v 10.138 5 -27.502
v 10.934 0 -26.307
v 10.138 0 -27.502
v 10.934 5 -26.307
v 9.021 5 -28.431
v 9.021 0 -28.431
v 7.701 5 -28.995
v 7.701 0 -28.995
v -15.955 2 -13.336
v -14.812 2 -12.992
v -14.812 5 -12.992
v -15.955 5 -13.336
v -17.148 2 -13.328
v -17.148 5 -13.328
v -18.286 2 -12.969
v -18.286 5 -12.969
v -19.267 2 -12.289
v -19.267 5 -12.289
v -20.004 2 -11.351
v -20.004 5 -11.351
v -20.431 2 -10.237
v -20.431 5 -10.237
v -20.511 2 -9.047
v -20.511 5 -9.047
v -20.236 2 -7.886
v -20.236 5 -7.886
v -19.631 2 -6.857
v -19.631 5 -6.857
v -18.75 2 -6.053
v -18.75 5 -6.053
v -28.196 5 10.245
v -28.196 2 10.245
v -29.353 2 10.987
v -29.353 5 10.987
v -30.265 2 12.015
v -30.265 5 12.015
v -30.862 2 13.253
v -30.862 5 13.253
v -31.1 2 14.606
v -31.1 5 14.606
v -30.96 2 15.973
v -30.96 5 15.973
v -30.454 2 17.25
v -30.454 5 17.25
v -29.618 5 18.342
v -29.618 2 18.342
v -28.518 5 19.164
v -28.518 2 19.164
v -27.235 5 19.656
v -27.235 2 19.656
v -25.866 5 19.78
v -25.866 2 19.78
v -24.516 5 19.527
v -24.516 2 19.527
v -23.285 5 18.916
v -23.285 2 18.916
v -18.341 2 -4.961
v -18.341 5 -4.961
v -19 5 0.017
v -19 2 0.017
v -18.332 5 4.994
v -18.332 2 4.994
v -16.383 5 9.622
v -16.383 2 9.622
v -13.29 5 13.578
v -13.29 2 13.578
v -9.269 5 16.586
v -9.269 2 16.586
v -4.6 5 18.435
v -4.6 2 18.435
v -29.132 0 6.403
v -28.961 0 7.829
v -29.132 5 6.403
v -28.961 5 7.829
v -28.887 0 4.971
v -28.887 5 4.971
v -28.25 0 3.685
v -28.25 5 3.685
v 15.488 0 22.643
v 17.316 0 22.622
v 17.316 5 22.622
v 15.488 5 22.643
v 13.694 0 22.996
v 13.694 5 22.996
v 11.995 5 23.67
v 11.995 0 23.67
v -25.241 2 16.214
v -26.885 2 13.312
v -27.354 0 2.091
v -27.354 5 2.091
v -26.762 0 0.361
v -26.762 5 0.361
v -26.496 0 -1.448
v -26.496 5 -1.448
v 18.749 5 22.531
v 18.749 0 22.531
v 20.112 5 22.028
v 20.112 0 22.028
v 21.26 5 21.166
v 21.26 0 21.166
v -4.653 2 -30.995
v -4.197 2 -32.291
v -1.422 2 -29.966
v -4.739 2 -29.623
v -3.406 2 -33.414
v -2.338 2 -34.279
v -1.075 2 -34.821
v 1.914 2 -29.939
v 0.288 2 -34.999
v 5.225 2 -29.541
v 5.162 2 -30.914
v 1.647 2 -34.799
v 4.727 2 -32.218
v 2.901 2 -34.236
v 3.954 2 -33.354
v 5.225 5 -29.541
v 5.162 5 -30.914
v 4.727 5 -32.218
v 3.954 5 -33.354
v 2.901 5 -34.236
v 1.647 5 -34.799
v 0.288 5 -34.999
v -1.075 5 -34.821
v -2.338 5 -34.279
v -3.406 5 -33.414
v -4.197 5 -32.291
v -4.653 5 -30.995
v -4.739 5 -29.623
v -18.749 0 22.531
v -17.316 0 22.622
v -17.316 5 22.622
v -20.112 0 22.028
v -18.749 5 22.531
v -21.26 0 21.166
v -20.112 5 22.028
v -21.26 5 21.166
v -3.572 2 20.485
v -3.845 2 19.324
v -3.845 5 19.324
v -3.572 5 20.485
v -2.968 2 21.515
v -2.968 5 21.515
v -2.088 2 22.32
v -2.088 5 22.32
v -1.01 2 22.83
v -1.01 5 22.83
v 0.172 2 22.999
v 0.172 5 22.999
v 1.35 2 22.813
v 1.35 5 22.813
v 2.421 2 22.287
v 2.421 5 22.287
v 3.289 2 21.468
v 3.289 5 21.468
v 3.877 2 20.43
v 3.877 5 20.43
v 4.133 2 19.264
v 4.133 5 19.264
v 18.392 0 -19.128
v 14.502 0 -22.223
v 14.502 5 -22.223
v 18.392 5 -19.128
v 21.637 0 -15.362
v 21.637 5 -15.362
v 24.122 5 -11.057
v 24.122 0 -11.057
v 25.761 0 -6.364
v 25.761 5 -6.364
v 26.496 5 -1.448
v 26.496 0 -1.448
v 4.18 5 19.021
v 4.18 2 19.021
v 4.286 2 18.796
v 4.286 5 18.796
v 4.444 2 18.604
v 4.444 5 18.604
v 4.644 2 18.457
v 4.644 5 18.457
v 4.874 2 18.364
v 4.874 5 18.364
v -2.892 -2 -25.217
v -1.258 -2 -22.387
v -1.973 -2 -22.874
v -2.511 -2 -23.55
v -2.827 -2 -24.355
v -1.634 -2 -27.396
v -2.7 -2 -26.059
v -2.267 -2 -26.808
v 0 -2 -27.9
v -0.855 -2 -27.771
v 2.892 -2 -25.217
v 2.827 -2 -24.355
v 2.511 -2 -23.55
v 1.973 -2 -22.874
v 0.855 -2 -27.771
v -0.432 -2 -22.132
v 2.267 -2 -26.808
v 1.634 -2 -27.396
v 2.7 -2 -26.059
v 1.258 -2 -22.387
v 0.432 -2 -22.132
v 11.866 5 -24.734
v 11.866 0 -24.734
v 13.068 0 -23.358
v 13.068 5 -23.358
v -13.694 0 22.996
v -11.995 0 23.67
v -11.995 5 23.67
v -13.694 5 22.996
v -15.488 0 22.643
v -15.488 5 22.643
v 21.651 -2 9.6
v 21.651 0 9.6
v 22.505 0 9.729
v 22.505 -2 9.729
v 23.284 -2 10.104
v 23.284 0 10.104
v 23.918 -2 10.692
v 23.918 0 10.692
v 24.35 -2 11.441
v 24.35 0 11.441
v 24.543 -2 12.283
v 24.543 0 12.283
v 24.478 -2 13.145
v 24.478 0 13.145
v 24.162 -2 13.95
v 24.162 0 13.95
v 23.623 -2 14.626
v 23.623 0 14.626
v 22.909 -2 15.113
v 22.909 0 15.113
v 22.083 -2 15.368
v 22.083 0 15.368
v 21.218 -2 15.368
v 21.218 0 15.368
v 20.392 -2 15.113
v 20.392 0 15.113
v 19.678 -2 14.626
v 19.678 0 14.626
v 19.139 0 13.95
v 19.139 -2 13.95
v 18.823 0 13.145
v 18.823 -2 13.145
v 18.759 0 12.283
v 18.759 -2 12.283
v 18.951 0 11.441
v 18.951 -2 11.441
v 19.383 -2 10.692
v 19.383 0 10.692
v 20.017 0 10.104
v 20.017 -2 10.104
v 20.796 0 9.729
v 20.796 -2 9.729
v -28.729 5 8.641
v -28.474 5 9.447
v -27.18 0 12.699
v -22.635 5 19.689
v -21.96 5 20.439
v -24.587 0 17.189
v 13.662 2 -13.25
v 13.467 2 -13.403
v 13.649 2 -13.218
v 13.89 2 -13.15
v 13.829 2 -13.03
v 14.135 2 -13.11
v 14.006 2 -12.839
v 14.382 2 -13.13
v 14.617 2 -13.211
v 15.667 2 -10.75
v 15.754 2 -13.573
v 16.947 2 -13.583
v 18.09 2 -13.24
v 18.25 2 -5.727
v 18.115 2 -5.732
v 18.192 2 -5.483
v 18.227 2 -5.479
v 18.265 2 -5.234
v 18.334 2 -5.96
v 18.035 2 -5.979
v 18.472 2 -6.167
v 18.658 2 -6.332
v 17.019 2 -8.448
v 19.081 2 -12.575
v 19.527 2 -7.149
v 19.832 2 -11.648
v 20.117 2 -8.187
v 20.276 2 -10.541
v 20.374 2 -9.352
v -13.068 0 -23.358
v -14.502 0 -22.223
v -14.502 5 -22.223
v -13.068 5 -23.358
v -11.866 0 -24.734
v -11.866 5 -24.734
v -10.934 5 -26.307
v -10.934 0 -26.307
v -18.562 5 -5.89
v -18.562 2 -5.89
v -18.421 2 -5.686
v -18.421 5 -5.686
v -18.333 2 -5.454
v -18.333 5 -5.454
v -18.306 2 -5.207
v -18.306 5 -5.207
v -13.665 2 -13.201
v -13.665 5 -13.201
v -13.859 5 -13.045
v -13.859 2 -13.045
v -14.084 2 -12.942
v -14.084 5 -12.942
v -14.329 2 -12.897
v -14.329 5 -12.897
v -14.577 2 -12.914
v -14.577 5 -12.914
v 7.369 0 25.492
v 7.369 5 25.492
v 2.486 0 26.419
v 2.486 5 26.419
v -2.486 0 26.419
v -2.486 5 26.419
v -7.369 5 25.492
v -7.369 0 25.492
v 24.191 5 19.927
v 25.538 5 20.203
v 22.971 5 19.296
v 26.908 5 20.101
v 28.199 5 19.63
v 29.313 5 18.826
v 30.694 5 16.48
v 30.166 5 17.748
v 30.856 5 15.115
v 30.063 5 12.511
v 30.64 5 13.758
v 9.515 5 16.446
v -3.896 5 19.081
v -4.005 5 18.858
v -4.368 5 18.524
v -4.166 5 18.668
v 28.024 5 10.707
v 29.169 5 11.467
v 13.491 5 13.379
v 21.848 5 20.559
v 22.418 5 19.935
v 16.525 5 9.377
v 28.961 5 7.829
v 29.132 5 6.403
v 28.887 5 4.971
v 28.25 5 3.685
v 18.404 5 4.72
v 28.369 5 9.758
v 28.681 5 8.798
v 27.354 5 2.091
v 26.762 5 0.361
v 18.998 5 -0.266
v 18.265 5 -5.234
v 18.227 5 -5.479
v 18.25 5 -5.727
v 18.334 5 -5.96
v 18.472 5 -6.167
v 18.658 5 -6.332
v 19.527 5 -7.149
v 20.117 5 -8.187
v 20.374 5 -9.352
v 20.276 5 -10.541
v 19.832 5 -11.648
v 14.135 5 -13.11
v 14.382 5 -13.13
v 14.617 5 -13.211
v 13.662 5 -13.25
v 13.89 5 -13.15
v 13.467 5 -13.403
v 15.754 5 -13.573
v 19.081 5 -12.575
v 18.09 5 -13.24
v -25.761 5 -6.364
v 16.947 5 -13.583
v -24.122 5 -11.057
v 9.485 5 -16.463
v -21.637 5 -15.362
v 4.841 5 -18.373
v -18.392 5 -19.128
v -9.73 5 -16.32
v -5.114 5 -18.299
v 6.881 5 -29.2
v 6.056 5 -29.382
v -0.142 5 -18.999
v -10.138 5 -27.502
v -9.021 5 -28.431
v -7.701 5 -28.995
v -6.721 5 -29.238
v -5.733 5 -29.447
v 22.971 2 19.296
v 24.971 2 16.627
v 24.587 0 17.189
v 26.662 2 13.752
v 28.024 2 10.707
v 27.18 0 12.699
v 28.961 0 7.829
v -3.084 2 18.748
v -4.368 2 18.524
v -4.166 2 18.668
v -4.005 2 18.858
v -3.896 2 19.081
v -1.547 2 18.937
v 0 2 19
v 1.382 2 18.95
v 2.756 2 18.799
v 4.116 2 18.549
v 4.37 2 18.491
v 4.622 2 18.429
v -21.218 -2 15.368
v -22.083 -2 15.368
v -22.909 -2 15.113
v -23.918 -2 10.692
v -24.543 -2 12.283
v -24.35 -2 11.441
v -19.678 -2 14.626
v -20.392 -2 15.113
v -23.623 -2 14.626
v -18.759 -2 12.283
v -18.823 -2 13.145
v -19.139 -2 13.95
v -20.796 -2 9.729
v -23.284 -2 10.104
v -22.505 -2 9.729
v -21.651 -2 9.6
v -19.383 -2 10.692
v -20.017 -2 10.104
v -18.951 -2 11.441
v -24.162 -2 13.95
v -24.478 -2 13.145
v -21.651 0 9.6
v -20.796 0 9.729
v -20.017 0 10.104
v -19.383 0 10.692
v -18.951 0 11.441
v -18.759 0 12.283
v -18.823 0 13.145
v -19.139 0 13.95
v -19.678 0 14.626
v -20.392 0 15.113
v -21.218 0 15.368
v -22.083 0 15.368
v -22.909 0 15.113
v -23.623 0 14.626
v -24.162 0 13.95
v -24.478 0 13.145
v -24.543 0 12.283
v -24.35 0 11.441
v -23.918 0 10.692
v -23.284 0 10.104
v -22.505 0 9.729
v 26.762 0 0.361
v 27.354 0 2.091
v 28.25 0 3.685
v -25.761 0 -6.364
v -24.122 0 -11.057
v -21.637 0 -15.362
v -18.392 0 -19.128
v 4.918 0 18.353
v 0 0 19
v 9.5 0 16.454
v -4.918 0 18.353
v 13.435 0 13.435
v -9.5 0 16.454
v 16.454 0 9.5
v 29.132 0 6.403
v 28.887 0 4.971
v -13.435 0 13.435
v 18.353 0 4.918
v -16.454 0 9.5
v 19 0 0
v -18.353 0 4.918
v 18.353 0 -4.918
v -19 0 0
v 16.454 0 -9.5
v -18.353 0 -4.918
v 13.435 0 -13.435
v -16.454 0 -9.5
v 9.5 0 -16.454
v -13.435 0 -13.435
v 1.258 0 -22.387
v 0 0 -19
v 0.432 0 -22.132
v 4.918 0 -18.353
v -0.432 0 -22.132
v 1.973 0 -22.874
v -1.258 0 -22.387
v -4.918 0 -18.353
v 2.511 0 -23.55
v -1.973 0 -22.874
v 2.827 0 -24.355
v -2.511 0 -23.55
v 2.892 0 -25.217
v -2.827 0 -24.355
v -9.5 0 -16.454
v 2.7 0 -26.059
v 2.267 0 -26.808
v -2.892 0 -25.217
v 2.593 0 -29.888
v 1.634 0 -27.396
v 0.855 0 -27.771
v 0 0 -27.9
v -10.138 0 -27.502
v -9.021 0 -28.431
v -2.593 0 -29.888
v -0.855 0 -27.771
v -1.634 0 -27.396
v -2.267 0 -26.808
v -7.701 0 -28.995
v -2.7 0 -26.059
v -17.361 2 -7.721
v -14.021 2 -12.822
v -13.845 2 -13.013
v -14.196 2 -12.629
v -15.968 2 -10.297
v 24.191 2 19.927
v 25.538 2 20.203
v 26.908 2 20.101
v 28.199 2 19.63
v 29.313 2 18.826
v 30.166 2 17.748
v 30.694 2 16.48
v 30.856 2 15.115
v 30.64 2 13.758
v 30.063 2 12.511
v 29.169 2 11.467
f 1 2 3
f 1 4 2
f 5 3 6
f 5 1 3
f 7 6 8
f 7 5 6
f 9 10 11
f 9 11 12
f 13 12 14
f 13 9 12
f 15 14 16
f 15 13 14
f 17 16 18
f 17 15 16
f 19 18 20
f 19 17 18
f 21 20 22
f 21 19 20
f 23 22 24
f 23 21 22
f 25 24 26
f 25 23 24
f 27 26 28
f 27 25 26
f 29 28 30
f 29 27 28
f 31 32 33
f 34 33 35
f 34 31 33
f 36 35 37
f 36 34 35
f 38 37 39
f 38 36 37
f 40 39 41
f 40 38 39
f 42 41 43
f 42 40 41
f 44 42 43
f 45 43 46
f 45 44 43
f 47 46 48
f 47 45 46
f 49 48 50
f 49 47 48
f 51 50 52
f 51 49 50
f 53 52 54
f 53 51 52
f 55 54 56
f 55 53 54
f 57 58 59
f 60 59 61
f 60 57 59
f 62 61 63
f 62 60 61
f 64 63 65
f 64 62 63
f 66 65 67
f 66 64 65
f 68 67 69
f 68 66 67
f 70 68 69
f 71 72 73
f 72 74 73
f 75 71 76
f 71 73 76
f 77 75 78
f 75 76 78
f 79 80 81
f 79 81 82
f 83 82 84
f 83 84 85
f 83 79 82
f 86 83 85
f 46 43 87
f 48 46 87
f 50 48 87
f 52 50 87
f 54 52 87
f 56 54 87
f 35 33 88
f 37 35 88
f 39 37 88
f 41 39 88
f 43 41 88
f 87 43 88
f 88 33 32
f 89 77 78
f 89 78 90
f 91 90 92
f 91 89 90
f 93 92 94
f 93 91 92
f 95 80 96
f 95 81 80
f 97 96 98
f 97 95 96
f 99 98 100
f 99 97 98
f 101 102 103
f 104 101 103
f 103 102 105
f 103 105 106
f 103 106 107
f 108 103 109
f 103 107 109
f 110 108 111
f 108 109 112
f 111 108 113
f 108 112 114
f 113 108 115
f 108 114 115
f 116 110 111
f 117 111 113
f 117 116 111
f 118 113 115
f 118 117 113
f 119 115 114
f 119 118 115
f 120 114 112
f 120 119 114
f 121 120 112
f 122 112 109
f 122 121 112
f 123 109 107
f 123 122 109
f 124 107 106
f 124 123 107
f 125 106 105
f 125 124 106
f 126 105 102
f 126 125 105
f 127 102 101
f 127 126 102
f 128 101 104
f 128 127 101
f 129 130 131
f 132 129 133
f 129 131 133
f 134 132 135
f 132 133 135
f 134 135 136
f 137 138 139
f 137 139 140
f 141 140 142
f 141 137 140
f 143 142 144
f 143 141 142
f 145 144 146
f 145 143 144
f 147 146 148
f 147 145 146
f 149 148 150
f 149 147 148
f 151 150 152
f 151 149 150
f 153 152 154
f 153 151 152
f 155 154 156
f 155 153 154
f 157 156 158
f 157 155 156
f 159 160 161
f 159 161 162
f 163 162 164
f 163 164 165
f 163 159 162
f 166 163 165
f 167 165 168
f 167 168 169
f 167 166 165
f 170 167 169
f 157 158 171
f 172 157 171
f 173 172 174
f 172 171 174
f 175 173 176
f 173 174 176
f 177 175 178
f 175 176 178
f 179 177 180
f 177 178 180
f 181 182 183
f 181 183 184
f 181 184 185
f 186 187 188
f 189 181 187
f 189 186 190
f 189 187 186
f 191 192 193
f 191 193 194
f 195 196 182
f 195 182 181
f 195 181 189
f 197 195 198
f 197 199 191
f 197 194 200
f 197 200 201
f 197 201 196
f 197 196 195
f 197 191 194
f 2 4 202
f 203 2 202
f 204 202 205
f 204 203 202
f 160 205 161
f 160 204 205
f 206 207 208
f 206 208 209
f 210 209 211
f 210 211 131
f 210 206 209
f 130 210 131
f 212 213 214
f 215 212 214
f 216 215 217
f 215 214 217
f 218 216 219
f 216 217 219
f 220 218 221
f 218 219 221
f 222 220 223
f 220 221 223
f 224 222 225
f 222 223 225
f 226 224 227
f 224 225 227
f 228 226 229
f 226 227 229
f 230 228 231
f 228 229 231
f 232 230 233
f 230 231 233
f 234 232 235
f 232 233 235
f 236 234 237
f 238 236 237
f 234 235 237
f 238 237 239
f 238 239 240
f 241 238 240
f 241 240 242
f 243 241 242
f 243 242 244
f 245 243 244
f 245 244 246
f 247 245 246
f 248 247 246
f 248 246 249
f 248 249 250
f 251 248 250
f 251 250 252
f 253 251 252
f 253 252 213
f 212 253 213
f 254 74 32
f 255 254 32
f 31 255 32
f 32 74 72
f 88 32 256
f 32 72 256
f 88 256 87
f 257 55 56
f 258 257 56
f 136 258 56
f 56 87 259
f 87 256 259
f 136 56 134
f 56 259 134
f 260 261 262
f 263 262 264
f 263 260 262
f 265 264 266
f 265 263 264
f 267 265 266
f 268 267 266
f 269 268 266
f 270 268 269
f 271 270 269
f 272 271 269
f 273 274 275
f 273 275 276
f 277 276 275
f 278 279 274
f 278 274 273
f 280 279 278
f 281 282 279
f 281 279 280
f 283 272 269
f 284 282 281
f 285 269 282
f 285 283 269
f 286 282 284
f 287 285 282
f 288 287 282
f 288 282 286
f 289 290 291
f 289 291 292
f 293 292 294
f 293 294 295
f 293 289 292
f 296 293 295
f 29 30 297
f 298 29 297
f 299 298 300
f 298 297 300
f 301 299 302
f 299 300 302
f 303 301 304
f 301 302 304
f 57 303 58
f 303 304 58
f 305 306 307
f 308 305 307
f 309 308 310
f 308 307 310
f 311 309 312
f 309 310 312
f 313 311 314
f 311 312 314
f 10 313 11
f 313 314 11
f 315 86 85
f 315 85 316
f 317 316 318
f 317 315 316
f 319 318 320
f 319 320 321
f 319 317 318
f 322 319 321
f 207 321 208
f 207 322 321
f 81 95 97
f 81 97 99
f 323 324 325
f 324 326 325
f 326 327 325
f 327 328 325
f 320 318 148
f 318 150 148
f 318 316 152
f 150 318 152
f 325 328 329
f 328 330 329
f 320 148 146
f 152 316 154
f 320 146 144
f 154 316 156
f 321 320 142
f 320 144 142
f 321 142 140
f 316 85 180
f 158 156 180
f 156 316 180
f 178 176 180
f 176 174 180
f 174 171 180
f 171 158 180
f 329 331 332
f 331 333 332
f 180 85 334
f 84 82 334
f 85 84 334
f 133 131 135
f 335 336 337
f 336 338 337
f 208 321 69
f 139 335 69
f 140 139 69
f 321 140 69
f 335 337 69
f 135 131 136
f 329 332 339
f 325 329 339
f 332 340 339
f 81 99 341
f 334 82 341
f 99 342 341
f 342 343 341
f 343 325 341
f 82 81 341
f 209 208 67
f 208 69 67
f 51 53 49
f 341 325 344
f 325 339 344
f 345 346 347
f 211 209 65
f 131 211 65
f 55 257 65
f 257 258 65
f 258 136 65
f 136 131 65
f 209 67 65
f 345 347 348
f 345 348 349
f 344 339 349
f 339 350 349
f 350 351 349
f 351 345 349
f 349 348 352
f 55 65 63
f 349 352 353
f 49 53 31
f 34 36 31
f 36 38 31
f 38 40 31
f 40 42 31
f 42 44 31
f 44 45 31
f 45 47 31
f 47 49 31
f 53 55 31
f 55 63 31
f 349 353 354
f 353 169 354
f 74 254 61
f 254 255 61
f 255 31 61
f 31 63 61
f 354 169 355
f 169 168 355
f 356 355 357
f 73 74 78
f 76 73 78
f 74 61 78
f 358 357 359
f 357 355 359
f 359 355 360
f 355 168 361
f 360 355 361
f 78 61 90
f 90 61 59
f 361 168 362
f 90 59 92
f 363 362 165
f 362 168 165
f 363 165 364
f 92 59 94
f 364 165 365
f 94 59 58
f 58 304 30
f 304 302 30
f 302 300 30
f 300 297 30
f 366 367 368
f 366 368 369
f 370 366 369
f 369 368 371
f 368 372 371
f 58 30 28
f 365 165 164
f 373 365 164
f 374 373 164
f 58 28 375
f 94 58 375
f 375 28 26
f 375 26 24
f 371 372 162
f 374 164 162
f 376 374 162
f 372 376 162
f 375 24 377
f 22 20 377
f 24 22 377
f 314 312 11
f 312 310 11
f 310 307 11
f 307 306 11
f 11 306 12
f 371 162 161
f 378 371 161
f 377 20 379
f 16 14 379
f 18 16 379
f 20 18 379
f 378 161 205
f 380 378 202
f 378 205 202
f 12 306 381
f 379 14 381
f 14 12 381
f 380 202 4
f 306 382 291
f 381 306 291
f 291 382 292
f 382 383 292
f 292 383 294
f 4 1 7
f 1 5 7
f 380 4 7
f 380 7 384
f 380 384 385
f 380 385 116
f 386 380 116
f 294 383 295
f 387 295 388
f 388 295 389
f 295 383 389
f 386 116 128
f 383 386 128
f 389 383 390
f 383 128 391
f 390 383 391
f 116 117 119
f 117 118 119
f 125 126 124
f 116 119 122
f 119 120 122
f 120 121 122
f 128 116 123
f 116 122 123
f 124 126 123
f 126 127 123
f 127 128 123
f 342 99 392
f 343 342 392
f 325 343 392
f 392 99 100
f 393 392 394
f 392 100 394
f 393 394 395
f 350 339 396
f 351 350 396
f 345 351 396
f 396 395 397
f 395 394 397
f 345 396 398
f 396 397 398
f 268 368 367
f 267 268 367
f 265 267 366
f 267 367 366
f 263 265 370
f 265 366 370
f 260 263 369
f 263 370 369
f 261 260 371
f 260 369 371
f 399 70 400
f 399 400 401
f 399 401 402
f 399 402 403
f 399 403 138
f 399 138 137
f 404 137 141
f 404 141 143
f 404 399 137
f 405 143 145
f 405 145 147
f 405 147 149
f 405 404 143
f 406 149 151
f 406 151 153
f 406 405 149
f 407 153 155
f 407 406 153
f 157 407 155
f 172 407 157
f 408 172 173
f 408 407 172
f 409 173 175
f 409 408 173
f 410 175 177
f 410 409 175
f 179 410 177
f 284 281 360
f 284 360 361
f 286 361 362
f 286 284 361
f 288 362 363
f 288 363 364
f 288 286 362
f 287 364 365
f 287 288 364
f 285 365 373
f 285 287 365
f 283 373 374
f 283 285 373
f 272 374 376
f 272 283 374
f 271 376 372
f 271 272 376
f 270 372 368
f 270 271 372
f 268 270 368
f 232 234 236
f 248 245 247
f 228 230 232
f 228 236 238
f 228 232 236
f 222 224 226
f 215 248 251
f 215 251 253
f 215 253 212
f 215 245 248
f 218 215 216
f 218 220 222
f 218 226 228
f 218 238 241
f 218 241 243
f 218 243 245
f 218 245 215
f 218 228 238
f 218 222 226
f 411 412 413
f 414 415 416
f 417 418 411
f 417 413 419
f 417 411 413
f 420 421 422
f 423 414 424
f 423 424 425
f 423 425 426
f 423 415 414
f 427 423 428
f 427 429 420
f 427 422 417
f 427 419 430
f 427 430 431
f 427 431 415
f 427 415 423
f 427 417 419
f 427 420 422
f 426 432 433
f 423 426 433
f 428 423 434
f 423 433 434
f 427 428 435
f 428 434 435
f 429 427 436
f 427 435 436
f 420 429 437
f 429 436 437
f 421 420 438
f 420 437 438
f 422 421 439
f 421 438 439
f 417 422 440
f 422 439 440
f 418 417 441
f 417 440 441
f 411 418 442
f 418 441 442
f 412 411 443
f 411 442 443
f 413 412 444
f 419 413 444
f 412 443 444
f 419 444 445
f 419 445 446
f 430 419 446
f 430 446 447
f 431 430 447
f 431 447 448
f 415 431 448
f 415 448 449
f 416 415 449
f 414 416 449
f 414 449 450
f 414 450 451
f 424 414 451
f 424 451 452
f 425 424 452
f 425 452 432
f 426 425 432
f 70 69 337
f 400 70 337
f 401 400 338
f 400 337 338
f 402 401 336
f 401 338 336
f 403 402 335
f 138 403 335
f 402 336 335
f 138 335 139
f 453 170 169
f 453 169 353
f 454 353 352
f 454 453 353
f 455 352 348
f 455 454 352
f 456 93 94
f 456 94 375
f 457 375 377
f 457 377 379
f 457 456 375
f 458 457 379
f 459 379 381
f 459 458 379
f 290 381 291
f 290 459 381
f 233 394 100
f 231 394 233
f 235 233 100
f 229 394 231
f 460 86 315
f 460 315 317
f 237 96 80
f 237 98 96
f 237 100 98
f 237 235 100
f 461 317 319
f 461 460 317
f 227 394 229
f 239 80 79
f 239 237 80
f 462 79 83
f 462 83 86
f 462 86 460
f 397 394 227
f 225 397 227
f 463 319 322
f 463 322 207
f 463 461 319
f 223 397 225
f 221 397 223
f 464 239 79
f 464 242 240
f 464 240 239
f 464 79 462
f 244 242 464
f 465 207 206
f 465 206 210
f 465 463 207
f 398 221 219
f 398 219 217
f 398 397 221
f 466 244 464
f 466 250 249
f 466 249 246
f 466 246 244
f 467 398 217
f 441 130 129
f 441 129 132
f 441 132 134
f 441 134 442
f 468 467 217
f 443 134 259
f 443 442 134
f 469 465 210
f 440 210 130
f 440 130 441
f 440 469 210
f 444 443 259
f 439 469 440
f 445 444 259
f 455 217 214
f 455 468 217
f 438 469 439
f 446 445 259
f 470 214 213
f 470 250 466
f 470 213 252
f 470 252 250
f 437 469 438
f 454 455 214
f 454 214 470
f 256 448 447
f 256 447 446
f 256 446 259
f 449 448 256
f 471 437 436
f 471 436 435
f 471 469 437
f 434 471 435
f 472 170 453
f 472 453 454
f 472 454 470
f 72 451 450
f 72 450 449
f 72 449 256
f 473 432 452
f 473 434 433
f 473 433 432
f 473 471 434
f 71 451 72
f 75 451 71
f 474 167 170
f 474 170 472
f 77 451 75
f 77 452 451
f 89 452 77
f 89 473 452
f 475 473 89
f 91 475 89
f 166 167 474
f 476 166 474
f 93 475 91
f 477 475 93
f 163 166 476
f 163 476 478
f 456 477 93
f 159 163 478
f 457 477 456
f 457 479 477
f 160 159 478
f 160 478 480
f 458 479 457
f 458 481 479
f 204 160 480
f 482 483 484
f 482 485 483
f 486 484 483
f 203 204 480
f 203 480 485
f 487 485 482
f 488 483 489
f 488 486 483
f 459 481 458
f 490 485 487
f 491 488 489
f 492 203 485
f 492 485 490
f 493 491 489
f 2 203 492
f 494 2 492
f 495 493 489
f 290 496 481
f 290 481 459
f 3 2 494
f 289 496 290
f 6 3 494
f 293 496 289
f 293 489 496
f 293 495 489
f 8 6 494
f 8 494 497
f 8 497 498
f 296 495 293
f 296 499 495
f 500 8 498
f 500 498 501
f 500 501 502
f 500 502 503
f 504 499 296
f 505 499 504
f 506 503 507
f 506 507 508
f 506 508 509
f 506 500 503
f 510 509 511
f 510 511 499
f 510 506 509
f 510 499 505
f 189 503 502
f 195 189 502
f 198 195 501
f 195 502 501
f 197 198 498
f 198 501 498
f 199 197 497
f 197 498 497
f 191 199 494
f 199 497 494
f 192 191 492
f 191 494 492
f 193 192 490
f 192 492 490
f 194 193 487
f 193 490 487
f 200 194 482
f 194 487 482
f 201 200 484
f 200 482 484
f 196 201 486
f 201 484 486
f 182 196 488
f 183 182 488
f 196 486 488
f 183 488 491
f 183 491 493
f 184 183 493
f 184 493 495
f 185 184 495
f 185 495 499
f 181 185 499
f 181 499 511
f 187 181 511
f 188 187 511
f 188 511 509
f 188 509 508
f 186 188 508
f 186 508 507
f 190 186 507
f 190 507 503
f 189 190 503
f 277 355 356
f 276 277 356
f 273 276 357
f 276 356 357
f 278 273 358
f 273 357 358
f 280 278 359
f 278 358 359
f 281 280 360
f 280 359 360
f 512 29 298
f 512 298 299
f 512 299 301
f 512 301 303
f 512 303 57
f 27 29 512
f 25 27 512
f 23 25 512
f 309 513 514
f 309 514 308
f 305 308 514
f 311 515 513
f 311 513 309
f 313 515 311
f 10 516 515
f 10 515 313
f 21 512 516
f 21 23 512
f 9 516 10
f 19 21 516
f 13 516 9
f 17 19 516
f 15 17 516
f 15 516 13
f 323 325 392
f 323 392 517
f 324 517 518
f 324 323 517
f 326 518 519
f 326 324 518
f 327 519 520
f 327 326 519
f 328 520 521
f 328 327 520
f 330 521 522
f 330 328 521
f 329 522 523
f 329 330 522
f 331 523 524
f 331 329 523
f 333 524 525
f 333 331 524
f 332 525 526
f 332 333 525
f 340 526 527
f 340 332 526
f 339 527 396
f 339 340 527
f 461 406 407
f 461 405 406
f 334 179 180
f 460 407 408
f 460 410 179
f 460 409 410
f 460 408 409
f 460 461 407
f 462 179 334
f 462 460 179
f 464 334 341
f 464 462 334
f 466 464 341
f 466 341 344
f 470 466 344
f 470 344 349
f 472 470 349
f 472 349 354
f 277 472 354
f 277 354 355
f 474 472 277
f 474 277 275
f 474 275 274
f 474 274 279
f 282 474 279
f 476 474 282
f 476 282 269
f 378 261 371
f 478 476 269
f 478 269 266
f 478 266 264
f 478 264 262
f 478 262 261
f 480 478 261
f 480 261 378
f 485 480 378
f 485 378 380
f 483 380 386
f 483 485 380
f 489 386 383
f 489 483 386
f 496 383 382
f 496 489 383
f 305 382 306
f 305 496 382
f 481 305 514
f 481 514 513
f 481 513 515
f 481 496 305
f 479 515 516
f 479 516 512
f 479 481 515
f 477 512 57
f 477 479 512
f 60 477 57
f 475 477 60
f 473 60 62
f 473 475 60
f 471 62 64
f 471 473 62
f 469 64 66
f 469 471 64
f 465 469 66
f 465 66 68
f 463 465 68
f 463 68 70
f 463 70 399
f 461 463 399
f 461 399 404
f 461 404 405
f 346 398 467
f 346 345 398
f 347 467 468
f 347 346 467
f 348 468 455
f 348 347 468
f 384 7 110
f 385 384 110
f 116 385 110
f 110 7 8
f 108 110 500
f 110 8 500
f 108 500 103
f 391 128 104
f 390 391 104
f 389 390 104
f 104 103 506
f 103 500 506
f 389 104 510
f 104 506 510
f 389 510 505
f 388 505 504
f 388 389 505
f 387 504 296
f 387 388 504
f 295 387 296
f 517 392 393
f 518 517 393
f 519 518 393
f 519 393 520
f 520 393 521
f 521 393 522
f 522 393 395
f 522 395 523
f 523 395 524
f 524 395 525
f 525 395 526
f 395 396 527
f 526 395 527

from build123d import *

# Parameters (mm, degrees)
SKETCH1_R                = 19
BOSS_EXTRUDE1_DEPTH      = 3.5
SKETCH2_R                = 30
SKETCH2_R_2              = 19
SKETCH2_R_3              = 2.8
BOSS_EXTRUDE2_DEPTH      = 5
BOSS_EXTRUDE3_DEPTH      = 2
BOSS_EXTRUDE3_DEPTH_BACK = 5
SKETCH4_R                = 2.9
SKETCH5_R                = 5
BOSS_EXTRUDE4_DEPTH      = 3
CUT_EXTRUDE1_START       = -10
SKETCH3_R                = 19
CUT_EXTRUDE1_DEPTH       = 10
CUT_EXTRUDE3_START       = -13
CUT_EXTRUDE3_DEPTH       = 13
FILLET1_R                = 10
FILLET2_R                = 5
CUT_EXTRUDE4_START       = -3
SKETCH8_R                = 4
SKETCH8_R_2              = 19
CUT_EXTRUDE4_DEPTH       = 3
FILLET3_R                = 1


with BuildPart() as part:
    # Sketch1 → Boss-Extrude1 (new body)
    with BuildSketch(Plane(origin=(0, 0, 0), x_dir=(1, 0, 0), z_dir=(0, 1, 0))):
        with Locations(Location((0, 0, 0), (0, 0, 270))):
            Circle(SKETCH1_R)
    extrude(amount=BOSS_EXTRUDE1_DEPTH)

    # Sketch2 → Boss-Extrude2 (add)
    with BuildSketch(Plane(origin=(0, 0, 0), x_dir=(1, 0, 0), z_dir=(0, 1, 0))):
        with Locations(Location((0, 0, 0), (0, 0, 270))):
            Circle(SKETCH2_R)
        with Locations(Location((0, 0, 0), (0, 0, 270))):
            Circle(SKETCH2_R_2, mode=Mode.SUBTRACT)
        with Locations(Location((0, 25, 0), (0, 0, 270))):
            Circle(SKETCH2_R_3, mode=Mode.SUBTRACT)
        with Locations(Location((21.650635095, -12.5, 0), (0, 0, 270))):
            Circle(SKETCH2_R_3, mode=Mode.SUBTRACT)
        with Locations(Location((-21.650635095, -12.5, 0), (0, 0, 270))):
            Circle(SKETCH2_R_3, mode=Mode.SUBTRACT)
    extrude(amount=BOSS_EXTRUDE2_DEPTH)

    # Sketch4 → Boss-Extrude3 (add, two sides: drawn at the far end of the back side and taken through both)
    with BuildSketch(Plane.XZ.offset(-BOSS_EXTRUDE3_DEPTH_BACK)):
        with Locations(Location((-21.650635095, 12.5, 0), (0, 0, 270))):
            Circle(SKETCH4_R)
        with Locations(Location((21.650635095, 12.5, 0), (0, 0, 270))):
            Circle(SKETCH4_R)
        with Locations(Location((0, -25, 0), (0, 0, 270))):
            Circle(SKETCH4_R)
    extrude(amount=BOSS_EXTRUDE3_DEPTH + BOSS_EXTRUDE3_DEPTH_BACK)

    # Sketch5 → Boss-Extrude4 (add)
    with BuildSketch(Plane(origin=(0, 5, 0), x_dir=(1, 0, 0), z_dir=(0, 1, 0))):
        with Locations((-26.103110985, -14.7860609)):
            Circle(SKETCH5_R)
        with Locations((0.246451131, 29.99898768)):
            Circle(SKETCH5_R)
        with Locations((25.856659853, -15.212926781)):
            Circle(SKETCH5_R)
    extrude(amount=-BOSS_EXTRUDE4_DEPTH)

    # Sketch3 → Cut-Extrude1 (cut)
    with BuildSketch(Plane(origin=(0, 3.5, 0), x_dir=(1, 0, 0), z_dir=(0, 1, 0)).offset(CUT_EXTRUDE1_START)):
        with Locations(Location((0, 0, 0), (0, 0, 270))):
            Circle(SKETCH3_R)
    extrude(amount=CUT_EXTRUDE1_DEPTH, mode=Mode.SUBTRACT)

    # Sketch7 → Cut-Extrude3 (cut)
    with BuildSketch(Plane(origin=(0, 5, 0), x_dir=(1, 0, 0), z_dir=(0, 1, 0)).offset(CUT_EXTRUDE3_START)):
        with BuildLine():
            ThreePointArc((-29.54423259, -5.20944533), (-25.980762114, 15), (-10.2606043, 28.190778624))
            Line((-10.2606043, 28.190778624), (-13.773984089, 37.84371026))
            Line((-13.773984089, 37.84371026), (-43.939319858, -7.747687605))
            Line((-43.939319858, -7.747687605), (-29.54423259, -5.20944533))
        make_face()
        with BuildLine():
            ThreePointArc((-26.13264562, -4.6078905), (-22.980662881, 13.267891901), (-9.075772579, 24.935480225))
            Line((-9.075772579, 24.935480225), (-10.2606043, 28.190778624))
            ThreePointArc((-10.2606043, 28.190778624), (-25.980762114, 15), (-29.54423259, -5.20944533))
            Line((-29.54423259, -5.20944533), (-26.13264562, -4.6078905))
        make_face()
        with BuildLine():
            Line((15.259965643, 41.926411025), (10.2606043, 28.190778624))
            ThreePointArc((10.2606043, 28.190778624), (25.980762114, 15), (29.54423259, -5.20944533))
            Line((29.54423259, -5.20944533), (39.660606503, -6.993234998))
            Line((39.660606503, -6.993234998), (15.259965643, 41.926411025))
        make_face()
        with BuildLine():
            Line((10.2606043, 28.190778624), (9.075772579, 24.935480225))
            ThreePointArc((9.075772579, 24.935480225), (21.736841548, 15.220300308), (26.535783801, 0))
            ThreePointArc((26.535783801, 0), (26.434807132, -2.312745947), (26.13264562, -4.6078905))
            Line((26.13264562, -4.6078905), (29.54423259, -5.20944533))
            ThreePointArc((29.54423259, -5.20944533), (25.980762114, 15), (10.2606043, 28.190778624))
        make_face()
        with BuildLine():
            Line((28.679354216, -34.17872342), (19.283628291, -22.981333294))
            ThreePointArc((19.283628291, -22.981333294), (0, -30), (-19.283628291, -22.981333294))
            Line((-19.283628291, -22.981333294), (-25.886622414, -30.850475262))
            Line((-25.886622414, -30.850475262), (28.679354216, -34.17872342))
        make_face()
        with BuildLine():
            Line((19.283628291, -22.981333294), (17.056873041, -20.327589725))
            ThreePointArc((17.056873041, -20.327589725), (0, -26.535783801), (-17.056873041, -20.327589725))
            Line((-17.056873041, -20.327589725), (-19.283628291, -22.981333294))
            ThreePointArc((-19.283628291, -22.981333294), (0, -30), (19.283628291, -22.981333294))
        make_face()
    extrude(amount=CUT_EXTRUDE3_DEPTH, mode=Mode.SUBTRACT)

    # Fillet1
    # the kernel refuses this fillet: 10 mm, written as the material it adds along each edge
    with BuildSketch(Plane(origin=(-26.13264562, 0, 4.6078905), x_dir=(-0.9848077530122318, 0, 0.17364817766679624), z_dir=(0, 1, 0)), Plane(origin=(17.056873041, 0, 20.327589725), x_dir=(0.6427876096865569, 0, 0.7660444431189634), z_dir=(0, 1, 0)), Plane(origin=(9.075772579, 0, -24.935480225), x_dir=(0.34202014332561265, 0, -0.9396926207859289), z_dir=(0, 1, 0))) as fillet1_piece_1:
        with BuildLine():
            CenterArc((9.045274498, -8.297697769), FILLET1_R, 123.92490422, 42.948020906)
            Line((-0.693413056, -6.026582466), (-0.888186807, -5.98116016))
            ThreePointArc((-0.888186807, -5.98116016), (-0.372612378, -3.01031053), (-0.2, 0))
            Line((-0.2, 0), (0, 0.2))
            ThreePointArc((0, 0.2), (1.732108099, 0.2), (3.352595033, 0.165953955))
            Line((3.352595033, 0.165953955), (3.464216199, 0))
        make_face()
    extrude(amount=5)
    with BuildSketch(Plane(origin=(-17.056873041, 0, 20.327589725), x_dir=(0.8344973728156843, 0, 0.551011918894429), z_dir=(0, 1, 0)), Plane(origin=(26.13264562, 0, 4.6078905), x_dir=(0.059941633142754296, 0, -0.99820188369697), z_dir=(0, 1, 0)), Plane(origin=(-9.075772579, 0, -24.935480225), x_dir=(-0.8944390059584274, 0, 0.44718996480254386), z_dir=(0, 1, 0))) as fillet1_piece_2:
        with BuildLine():
            CenterArc((7.20939257, -9.934457095), FILLET1_R, 96.563537437, 42.948020906)
            Line((-0.39597707, -3.441510719), (-0.548084463, -3.311651792))
            ThreePointArc((-0.548084463, -3.311651792), (-0.396677677, -1.697894369), (-0.198689142, 0.022860991))
            Line((-0.198689142, 0.022860991), (0.022860991, 0.198689142))
            ThreePointArc((0.022860991, 0.198689142), (3.03317152, 0.026076764), (6.04348205, 0.198689142))
            Line((6.04348205, 0.198689142), (6.06634304, 0))
        make_face()
    extrude(amount=5)

    # Fillet2
    fillet2_edges = [part.edges().sort_by_distance(p)[0] for p in [
        (-10.2606043, 2.5, -28.190778624),
        (-29.54423259, 2.5, 5.20944533),
        (-19.283628291, 2.5, 22.981333294),
        (19.283628291, 2.5, 22.981333294),
        (29.54423259, 2.5, 5.20944533),
        (10.2606043, 2.5, -28.190778624),
    ]]
    fillet(fillet2_edges, radius=FILLET2_R)

    # Sketch8 → Cut-Extrude4 (cut)
    with BuildSketch(Plane(origin=(0, 5, 0), x_dir=(1, 0, 0), z_dir=(0, 1, 0)).offset(CUT_EXTRUDE4_START)):
        with Locations((-16.524893724, 9.376987118)):
            Circle(SKETCH8_R)
        with Locations(Location((0, 0, 0), (0, 0, 42.512080704))):
            Circle(SKETCH8_R_2)
        with Locations((16.383155917, 9.622484201)):
            Circle(SKETCH8_R)
        with Locations((0.141737807, -18.999471319)):
            Circle(SKETCH8_R)
    extrude(amount=CUT_EXTRUDE4_DEPTH, mode=Mode.SUBTRACT)

    # Fillet3
    # the kernel refuses this fillet: 1 mm, written as the material it takes off along each edge
    with BuildSketch(Plane(origin=(-18.121826323, 6.950278825, -5.709589366), x_dir=(-0.28086097725665193, 0, 0.9597484625955065), z_dir=(0, -1, 0)), Plane(origin=(14.005562597, 6.950278825, -12.839167276), x_dir=(-0.6907360612225409, 0, -0.7231069725336425), z_dir=(0, -1, 0))) as fillet3_piece_1:
        with BuildLine():
            CenterArc((0.800640781, 0.999789253), FILLET3_R, 197.486602821, 71.337075115)
            ThreePointArc((-0.153146456, 0.699306464), (-0.060897436, 0.353086193), (0, 0))
            ThreePointArc((0, 0), (0.390055765, 0.004004198), (0.78011153, 0))
        make_face()
    extrude(amount=4.950278825, mode=Mode.SUBTRACT)
    with BuildSketch(Plane(origin=(-14.195555863, 6.950278825, -12.628784333), x_dir=(-0.8617980531882996, 0, -0.5072515308216002), z_dir=(0, -1, 0)), Plane(origin=(18.034625983, 6.950278825, -5.979319831), x_dir=(0.8701917383942803, 0, -0.49271324158209956), z_dir=(0, -1, 0))) as fillet3_piece_2:
        with BuildLine():
            CenterArc((0.805364366, 0.995988176), FILLET3_R, 193.528948716, 71.337075115)
            ThreePointArc((-0.166887482, 0.762051552), (-0.079532242, 0.381882385), (0, 0))
            ThreePointArc((0, 0), (0.357939718, 0.016047295), (0.715879437, 0))
        make_face()
    extrude(amount=4.950278825, mode=Mode.SUBTRACT)
    with BuildSketch(Plane(origin=(4.116263726, 6.950278825, 18.548756641), x_dir=(0.023311579398747933, 0, 0.9997282482084497), z_dir=(0, -1, 0))) as fillet3_piece_3:
        with BuildLine():
            CenterArc((0.805364366, -0.995988176), FILLET3_R, 95.133976169, 71.337075115)
            ThreePointArc((-0.166887482, -0.762051552), (-0.079532242, -0.381882385), (0, 0))
            ThreePointArc((0, 0), (0.357939718, -0.016047295), (0.715879437, 0))
        make_face()
    extrude(amount=4.950278825, mode=Mode.SUBTRACT)
    with BuildSketch(Plane(origin=(-3.83907012, 6.950278825, 18.608104165), x_dir=(-0.9750194381231715, 0, -0.22211955177780904), z_dir=(0, -1, 0))) as fillet3_piece_4:
        with BuildLine():
            CenterArc((0.800640781, -0.999789253), FILLET3_R, 91.176322064, 71.337075115)
            ThreePointArc((-0.153146456, -0.699306464), (-0.060897436, -0.353086193), (0, 0))
            ThreePointArc((0, 0), (0.390055765, -0.004004198), (0.78011153, 0))
        make_face()
    extrude(amount=4.950278825, mode=Mode.SUBTRACT)


solid = part.part
